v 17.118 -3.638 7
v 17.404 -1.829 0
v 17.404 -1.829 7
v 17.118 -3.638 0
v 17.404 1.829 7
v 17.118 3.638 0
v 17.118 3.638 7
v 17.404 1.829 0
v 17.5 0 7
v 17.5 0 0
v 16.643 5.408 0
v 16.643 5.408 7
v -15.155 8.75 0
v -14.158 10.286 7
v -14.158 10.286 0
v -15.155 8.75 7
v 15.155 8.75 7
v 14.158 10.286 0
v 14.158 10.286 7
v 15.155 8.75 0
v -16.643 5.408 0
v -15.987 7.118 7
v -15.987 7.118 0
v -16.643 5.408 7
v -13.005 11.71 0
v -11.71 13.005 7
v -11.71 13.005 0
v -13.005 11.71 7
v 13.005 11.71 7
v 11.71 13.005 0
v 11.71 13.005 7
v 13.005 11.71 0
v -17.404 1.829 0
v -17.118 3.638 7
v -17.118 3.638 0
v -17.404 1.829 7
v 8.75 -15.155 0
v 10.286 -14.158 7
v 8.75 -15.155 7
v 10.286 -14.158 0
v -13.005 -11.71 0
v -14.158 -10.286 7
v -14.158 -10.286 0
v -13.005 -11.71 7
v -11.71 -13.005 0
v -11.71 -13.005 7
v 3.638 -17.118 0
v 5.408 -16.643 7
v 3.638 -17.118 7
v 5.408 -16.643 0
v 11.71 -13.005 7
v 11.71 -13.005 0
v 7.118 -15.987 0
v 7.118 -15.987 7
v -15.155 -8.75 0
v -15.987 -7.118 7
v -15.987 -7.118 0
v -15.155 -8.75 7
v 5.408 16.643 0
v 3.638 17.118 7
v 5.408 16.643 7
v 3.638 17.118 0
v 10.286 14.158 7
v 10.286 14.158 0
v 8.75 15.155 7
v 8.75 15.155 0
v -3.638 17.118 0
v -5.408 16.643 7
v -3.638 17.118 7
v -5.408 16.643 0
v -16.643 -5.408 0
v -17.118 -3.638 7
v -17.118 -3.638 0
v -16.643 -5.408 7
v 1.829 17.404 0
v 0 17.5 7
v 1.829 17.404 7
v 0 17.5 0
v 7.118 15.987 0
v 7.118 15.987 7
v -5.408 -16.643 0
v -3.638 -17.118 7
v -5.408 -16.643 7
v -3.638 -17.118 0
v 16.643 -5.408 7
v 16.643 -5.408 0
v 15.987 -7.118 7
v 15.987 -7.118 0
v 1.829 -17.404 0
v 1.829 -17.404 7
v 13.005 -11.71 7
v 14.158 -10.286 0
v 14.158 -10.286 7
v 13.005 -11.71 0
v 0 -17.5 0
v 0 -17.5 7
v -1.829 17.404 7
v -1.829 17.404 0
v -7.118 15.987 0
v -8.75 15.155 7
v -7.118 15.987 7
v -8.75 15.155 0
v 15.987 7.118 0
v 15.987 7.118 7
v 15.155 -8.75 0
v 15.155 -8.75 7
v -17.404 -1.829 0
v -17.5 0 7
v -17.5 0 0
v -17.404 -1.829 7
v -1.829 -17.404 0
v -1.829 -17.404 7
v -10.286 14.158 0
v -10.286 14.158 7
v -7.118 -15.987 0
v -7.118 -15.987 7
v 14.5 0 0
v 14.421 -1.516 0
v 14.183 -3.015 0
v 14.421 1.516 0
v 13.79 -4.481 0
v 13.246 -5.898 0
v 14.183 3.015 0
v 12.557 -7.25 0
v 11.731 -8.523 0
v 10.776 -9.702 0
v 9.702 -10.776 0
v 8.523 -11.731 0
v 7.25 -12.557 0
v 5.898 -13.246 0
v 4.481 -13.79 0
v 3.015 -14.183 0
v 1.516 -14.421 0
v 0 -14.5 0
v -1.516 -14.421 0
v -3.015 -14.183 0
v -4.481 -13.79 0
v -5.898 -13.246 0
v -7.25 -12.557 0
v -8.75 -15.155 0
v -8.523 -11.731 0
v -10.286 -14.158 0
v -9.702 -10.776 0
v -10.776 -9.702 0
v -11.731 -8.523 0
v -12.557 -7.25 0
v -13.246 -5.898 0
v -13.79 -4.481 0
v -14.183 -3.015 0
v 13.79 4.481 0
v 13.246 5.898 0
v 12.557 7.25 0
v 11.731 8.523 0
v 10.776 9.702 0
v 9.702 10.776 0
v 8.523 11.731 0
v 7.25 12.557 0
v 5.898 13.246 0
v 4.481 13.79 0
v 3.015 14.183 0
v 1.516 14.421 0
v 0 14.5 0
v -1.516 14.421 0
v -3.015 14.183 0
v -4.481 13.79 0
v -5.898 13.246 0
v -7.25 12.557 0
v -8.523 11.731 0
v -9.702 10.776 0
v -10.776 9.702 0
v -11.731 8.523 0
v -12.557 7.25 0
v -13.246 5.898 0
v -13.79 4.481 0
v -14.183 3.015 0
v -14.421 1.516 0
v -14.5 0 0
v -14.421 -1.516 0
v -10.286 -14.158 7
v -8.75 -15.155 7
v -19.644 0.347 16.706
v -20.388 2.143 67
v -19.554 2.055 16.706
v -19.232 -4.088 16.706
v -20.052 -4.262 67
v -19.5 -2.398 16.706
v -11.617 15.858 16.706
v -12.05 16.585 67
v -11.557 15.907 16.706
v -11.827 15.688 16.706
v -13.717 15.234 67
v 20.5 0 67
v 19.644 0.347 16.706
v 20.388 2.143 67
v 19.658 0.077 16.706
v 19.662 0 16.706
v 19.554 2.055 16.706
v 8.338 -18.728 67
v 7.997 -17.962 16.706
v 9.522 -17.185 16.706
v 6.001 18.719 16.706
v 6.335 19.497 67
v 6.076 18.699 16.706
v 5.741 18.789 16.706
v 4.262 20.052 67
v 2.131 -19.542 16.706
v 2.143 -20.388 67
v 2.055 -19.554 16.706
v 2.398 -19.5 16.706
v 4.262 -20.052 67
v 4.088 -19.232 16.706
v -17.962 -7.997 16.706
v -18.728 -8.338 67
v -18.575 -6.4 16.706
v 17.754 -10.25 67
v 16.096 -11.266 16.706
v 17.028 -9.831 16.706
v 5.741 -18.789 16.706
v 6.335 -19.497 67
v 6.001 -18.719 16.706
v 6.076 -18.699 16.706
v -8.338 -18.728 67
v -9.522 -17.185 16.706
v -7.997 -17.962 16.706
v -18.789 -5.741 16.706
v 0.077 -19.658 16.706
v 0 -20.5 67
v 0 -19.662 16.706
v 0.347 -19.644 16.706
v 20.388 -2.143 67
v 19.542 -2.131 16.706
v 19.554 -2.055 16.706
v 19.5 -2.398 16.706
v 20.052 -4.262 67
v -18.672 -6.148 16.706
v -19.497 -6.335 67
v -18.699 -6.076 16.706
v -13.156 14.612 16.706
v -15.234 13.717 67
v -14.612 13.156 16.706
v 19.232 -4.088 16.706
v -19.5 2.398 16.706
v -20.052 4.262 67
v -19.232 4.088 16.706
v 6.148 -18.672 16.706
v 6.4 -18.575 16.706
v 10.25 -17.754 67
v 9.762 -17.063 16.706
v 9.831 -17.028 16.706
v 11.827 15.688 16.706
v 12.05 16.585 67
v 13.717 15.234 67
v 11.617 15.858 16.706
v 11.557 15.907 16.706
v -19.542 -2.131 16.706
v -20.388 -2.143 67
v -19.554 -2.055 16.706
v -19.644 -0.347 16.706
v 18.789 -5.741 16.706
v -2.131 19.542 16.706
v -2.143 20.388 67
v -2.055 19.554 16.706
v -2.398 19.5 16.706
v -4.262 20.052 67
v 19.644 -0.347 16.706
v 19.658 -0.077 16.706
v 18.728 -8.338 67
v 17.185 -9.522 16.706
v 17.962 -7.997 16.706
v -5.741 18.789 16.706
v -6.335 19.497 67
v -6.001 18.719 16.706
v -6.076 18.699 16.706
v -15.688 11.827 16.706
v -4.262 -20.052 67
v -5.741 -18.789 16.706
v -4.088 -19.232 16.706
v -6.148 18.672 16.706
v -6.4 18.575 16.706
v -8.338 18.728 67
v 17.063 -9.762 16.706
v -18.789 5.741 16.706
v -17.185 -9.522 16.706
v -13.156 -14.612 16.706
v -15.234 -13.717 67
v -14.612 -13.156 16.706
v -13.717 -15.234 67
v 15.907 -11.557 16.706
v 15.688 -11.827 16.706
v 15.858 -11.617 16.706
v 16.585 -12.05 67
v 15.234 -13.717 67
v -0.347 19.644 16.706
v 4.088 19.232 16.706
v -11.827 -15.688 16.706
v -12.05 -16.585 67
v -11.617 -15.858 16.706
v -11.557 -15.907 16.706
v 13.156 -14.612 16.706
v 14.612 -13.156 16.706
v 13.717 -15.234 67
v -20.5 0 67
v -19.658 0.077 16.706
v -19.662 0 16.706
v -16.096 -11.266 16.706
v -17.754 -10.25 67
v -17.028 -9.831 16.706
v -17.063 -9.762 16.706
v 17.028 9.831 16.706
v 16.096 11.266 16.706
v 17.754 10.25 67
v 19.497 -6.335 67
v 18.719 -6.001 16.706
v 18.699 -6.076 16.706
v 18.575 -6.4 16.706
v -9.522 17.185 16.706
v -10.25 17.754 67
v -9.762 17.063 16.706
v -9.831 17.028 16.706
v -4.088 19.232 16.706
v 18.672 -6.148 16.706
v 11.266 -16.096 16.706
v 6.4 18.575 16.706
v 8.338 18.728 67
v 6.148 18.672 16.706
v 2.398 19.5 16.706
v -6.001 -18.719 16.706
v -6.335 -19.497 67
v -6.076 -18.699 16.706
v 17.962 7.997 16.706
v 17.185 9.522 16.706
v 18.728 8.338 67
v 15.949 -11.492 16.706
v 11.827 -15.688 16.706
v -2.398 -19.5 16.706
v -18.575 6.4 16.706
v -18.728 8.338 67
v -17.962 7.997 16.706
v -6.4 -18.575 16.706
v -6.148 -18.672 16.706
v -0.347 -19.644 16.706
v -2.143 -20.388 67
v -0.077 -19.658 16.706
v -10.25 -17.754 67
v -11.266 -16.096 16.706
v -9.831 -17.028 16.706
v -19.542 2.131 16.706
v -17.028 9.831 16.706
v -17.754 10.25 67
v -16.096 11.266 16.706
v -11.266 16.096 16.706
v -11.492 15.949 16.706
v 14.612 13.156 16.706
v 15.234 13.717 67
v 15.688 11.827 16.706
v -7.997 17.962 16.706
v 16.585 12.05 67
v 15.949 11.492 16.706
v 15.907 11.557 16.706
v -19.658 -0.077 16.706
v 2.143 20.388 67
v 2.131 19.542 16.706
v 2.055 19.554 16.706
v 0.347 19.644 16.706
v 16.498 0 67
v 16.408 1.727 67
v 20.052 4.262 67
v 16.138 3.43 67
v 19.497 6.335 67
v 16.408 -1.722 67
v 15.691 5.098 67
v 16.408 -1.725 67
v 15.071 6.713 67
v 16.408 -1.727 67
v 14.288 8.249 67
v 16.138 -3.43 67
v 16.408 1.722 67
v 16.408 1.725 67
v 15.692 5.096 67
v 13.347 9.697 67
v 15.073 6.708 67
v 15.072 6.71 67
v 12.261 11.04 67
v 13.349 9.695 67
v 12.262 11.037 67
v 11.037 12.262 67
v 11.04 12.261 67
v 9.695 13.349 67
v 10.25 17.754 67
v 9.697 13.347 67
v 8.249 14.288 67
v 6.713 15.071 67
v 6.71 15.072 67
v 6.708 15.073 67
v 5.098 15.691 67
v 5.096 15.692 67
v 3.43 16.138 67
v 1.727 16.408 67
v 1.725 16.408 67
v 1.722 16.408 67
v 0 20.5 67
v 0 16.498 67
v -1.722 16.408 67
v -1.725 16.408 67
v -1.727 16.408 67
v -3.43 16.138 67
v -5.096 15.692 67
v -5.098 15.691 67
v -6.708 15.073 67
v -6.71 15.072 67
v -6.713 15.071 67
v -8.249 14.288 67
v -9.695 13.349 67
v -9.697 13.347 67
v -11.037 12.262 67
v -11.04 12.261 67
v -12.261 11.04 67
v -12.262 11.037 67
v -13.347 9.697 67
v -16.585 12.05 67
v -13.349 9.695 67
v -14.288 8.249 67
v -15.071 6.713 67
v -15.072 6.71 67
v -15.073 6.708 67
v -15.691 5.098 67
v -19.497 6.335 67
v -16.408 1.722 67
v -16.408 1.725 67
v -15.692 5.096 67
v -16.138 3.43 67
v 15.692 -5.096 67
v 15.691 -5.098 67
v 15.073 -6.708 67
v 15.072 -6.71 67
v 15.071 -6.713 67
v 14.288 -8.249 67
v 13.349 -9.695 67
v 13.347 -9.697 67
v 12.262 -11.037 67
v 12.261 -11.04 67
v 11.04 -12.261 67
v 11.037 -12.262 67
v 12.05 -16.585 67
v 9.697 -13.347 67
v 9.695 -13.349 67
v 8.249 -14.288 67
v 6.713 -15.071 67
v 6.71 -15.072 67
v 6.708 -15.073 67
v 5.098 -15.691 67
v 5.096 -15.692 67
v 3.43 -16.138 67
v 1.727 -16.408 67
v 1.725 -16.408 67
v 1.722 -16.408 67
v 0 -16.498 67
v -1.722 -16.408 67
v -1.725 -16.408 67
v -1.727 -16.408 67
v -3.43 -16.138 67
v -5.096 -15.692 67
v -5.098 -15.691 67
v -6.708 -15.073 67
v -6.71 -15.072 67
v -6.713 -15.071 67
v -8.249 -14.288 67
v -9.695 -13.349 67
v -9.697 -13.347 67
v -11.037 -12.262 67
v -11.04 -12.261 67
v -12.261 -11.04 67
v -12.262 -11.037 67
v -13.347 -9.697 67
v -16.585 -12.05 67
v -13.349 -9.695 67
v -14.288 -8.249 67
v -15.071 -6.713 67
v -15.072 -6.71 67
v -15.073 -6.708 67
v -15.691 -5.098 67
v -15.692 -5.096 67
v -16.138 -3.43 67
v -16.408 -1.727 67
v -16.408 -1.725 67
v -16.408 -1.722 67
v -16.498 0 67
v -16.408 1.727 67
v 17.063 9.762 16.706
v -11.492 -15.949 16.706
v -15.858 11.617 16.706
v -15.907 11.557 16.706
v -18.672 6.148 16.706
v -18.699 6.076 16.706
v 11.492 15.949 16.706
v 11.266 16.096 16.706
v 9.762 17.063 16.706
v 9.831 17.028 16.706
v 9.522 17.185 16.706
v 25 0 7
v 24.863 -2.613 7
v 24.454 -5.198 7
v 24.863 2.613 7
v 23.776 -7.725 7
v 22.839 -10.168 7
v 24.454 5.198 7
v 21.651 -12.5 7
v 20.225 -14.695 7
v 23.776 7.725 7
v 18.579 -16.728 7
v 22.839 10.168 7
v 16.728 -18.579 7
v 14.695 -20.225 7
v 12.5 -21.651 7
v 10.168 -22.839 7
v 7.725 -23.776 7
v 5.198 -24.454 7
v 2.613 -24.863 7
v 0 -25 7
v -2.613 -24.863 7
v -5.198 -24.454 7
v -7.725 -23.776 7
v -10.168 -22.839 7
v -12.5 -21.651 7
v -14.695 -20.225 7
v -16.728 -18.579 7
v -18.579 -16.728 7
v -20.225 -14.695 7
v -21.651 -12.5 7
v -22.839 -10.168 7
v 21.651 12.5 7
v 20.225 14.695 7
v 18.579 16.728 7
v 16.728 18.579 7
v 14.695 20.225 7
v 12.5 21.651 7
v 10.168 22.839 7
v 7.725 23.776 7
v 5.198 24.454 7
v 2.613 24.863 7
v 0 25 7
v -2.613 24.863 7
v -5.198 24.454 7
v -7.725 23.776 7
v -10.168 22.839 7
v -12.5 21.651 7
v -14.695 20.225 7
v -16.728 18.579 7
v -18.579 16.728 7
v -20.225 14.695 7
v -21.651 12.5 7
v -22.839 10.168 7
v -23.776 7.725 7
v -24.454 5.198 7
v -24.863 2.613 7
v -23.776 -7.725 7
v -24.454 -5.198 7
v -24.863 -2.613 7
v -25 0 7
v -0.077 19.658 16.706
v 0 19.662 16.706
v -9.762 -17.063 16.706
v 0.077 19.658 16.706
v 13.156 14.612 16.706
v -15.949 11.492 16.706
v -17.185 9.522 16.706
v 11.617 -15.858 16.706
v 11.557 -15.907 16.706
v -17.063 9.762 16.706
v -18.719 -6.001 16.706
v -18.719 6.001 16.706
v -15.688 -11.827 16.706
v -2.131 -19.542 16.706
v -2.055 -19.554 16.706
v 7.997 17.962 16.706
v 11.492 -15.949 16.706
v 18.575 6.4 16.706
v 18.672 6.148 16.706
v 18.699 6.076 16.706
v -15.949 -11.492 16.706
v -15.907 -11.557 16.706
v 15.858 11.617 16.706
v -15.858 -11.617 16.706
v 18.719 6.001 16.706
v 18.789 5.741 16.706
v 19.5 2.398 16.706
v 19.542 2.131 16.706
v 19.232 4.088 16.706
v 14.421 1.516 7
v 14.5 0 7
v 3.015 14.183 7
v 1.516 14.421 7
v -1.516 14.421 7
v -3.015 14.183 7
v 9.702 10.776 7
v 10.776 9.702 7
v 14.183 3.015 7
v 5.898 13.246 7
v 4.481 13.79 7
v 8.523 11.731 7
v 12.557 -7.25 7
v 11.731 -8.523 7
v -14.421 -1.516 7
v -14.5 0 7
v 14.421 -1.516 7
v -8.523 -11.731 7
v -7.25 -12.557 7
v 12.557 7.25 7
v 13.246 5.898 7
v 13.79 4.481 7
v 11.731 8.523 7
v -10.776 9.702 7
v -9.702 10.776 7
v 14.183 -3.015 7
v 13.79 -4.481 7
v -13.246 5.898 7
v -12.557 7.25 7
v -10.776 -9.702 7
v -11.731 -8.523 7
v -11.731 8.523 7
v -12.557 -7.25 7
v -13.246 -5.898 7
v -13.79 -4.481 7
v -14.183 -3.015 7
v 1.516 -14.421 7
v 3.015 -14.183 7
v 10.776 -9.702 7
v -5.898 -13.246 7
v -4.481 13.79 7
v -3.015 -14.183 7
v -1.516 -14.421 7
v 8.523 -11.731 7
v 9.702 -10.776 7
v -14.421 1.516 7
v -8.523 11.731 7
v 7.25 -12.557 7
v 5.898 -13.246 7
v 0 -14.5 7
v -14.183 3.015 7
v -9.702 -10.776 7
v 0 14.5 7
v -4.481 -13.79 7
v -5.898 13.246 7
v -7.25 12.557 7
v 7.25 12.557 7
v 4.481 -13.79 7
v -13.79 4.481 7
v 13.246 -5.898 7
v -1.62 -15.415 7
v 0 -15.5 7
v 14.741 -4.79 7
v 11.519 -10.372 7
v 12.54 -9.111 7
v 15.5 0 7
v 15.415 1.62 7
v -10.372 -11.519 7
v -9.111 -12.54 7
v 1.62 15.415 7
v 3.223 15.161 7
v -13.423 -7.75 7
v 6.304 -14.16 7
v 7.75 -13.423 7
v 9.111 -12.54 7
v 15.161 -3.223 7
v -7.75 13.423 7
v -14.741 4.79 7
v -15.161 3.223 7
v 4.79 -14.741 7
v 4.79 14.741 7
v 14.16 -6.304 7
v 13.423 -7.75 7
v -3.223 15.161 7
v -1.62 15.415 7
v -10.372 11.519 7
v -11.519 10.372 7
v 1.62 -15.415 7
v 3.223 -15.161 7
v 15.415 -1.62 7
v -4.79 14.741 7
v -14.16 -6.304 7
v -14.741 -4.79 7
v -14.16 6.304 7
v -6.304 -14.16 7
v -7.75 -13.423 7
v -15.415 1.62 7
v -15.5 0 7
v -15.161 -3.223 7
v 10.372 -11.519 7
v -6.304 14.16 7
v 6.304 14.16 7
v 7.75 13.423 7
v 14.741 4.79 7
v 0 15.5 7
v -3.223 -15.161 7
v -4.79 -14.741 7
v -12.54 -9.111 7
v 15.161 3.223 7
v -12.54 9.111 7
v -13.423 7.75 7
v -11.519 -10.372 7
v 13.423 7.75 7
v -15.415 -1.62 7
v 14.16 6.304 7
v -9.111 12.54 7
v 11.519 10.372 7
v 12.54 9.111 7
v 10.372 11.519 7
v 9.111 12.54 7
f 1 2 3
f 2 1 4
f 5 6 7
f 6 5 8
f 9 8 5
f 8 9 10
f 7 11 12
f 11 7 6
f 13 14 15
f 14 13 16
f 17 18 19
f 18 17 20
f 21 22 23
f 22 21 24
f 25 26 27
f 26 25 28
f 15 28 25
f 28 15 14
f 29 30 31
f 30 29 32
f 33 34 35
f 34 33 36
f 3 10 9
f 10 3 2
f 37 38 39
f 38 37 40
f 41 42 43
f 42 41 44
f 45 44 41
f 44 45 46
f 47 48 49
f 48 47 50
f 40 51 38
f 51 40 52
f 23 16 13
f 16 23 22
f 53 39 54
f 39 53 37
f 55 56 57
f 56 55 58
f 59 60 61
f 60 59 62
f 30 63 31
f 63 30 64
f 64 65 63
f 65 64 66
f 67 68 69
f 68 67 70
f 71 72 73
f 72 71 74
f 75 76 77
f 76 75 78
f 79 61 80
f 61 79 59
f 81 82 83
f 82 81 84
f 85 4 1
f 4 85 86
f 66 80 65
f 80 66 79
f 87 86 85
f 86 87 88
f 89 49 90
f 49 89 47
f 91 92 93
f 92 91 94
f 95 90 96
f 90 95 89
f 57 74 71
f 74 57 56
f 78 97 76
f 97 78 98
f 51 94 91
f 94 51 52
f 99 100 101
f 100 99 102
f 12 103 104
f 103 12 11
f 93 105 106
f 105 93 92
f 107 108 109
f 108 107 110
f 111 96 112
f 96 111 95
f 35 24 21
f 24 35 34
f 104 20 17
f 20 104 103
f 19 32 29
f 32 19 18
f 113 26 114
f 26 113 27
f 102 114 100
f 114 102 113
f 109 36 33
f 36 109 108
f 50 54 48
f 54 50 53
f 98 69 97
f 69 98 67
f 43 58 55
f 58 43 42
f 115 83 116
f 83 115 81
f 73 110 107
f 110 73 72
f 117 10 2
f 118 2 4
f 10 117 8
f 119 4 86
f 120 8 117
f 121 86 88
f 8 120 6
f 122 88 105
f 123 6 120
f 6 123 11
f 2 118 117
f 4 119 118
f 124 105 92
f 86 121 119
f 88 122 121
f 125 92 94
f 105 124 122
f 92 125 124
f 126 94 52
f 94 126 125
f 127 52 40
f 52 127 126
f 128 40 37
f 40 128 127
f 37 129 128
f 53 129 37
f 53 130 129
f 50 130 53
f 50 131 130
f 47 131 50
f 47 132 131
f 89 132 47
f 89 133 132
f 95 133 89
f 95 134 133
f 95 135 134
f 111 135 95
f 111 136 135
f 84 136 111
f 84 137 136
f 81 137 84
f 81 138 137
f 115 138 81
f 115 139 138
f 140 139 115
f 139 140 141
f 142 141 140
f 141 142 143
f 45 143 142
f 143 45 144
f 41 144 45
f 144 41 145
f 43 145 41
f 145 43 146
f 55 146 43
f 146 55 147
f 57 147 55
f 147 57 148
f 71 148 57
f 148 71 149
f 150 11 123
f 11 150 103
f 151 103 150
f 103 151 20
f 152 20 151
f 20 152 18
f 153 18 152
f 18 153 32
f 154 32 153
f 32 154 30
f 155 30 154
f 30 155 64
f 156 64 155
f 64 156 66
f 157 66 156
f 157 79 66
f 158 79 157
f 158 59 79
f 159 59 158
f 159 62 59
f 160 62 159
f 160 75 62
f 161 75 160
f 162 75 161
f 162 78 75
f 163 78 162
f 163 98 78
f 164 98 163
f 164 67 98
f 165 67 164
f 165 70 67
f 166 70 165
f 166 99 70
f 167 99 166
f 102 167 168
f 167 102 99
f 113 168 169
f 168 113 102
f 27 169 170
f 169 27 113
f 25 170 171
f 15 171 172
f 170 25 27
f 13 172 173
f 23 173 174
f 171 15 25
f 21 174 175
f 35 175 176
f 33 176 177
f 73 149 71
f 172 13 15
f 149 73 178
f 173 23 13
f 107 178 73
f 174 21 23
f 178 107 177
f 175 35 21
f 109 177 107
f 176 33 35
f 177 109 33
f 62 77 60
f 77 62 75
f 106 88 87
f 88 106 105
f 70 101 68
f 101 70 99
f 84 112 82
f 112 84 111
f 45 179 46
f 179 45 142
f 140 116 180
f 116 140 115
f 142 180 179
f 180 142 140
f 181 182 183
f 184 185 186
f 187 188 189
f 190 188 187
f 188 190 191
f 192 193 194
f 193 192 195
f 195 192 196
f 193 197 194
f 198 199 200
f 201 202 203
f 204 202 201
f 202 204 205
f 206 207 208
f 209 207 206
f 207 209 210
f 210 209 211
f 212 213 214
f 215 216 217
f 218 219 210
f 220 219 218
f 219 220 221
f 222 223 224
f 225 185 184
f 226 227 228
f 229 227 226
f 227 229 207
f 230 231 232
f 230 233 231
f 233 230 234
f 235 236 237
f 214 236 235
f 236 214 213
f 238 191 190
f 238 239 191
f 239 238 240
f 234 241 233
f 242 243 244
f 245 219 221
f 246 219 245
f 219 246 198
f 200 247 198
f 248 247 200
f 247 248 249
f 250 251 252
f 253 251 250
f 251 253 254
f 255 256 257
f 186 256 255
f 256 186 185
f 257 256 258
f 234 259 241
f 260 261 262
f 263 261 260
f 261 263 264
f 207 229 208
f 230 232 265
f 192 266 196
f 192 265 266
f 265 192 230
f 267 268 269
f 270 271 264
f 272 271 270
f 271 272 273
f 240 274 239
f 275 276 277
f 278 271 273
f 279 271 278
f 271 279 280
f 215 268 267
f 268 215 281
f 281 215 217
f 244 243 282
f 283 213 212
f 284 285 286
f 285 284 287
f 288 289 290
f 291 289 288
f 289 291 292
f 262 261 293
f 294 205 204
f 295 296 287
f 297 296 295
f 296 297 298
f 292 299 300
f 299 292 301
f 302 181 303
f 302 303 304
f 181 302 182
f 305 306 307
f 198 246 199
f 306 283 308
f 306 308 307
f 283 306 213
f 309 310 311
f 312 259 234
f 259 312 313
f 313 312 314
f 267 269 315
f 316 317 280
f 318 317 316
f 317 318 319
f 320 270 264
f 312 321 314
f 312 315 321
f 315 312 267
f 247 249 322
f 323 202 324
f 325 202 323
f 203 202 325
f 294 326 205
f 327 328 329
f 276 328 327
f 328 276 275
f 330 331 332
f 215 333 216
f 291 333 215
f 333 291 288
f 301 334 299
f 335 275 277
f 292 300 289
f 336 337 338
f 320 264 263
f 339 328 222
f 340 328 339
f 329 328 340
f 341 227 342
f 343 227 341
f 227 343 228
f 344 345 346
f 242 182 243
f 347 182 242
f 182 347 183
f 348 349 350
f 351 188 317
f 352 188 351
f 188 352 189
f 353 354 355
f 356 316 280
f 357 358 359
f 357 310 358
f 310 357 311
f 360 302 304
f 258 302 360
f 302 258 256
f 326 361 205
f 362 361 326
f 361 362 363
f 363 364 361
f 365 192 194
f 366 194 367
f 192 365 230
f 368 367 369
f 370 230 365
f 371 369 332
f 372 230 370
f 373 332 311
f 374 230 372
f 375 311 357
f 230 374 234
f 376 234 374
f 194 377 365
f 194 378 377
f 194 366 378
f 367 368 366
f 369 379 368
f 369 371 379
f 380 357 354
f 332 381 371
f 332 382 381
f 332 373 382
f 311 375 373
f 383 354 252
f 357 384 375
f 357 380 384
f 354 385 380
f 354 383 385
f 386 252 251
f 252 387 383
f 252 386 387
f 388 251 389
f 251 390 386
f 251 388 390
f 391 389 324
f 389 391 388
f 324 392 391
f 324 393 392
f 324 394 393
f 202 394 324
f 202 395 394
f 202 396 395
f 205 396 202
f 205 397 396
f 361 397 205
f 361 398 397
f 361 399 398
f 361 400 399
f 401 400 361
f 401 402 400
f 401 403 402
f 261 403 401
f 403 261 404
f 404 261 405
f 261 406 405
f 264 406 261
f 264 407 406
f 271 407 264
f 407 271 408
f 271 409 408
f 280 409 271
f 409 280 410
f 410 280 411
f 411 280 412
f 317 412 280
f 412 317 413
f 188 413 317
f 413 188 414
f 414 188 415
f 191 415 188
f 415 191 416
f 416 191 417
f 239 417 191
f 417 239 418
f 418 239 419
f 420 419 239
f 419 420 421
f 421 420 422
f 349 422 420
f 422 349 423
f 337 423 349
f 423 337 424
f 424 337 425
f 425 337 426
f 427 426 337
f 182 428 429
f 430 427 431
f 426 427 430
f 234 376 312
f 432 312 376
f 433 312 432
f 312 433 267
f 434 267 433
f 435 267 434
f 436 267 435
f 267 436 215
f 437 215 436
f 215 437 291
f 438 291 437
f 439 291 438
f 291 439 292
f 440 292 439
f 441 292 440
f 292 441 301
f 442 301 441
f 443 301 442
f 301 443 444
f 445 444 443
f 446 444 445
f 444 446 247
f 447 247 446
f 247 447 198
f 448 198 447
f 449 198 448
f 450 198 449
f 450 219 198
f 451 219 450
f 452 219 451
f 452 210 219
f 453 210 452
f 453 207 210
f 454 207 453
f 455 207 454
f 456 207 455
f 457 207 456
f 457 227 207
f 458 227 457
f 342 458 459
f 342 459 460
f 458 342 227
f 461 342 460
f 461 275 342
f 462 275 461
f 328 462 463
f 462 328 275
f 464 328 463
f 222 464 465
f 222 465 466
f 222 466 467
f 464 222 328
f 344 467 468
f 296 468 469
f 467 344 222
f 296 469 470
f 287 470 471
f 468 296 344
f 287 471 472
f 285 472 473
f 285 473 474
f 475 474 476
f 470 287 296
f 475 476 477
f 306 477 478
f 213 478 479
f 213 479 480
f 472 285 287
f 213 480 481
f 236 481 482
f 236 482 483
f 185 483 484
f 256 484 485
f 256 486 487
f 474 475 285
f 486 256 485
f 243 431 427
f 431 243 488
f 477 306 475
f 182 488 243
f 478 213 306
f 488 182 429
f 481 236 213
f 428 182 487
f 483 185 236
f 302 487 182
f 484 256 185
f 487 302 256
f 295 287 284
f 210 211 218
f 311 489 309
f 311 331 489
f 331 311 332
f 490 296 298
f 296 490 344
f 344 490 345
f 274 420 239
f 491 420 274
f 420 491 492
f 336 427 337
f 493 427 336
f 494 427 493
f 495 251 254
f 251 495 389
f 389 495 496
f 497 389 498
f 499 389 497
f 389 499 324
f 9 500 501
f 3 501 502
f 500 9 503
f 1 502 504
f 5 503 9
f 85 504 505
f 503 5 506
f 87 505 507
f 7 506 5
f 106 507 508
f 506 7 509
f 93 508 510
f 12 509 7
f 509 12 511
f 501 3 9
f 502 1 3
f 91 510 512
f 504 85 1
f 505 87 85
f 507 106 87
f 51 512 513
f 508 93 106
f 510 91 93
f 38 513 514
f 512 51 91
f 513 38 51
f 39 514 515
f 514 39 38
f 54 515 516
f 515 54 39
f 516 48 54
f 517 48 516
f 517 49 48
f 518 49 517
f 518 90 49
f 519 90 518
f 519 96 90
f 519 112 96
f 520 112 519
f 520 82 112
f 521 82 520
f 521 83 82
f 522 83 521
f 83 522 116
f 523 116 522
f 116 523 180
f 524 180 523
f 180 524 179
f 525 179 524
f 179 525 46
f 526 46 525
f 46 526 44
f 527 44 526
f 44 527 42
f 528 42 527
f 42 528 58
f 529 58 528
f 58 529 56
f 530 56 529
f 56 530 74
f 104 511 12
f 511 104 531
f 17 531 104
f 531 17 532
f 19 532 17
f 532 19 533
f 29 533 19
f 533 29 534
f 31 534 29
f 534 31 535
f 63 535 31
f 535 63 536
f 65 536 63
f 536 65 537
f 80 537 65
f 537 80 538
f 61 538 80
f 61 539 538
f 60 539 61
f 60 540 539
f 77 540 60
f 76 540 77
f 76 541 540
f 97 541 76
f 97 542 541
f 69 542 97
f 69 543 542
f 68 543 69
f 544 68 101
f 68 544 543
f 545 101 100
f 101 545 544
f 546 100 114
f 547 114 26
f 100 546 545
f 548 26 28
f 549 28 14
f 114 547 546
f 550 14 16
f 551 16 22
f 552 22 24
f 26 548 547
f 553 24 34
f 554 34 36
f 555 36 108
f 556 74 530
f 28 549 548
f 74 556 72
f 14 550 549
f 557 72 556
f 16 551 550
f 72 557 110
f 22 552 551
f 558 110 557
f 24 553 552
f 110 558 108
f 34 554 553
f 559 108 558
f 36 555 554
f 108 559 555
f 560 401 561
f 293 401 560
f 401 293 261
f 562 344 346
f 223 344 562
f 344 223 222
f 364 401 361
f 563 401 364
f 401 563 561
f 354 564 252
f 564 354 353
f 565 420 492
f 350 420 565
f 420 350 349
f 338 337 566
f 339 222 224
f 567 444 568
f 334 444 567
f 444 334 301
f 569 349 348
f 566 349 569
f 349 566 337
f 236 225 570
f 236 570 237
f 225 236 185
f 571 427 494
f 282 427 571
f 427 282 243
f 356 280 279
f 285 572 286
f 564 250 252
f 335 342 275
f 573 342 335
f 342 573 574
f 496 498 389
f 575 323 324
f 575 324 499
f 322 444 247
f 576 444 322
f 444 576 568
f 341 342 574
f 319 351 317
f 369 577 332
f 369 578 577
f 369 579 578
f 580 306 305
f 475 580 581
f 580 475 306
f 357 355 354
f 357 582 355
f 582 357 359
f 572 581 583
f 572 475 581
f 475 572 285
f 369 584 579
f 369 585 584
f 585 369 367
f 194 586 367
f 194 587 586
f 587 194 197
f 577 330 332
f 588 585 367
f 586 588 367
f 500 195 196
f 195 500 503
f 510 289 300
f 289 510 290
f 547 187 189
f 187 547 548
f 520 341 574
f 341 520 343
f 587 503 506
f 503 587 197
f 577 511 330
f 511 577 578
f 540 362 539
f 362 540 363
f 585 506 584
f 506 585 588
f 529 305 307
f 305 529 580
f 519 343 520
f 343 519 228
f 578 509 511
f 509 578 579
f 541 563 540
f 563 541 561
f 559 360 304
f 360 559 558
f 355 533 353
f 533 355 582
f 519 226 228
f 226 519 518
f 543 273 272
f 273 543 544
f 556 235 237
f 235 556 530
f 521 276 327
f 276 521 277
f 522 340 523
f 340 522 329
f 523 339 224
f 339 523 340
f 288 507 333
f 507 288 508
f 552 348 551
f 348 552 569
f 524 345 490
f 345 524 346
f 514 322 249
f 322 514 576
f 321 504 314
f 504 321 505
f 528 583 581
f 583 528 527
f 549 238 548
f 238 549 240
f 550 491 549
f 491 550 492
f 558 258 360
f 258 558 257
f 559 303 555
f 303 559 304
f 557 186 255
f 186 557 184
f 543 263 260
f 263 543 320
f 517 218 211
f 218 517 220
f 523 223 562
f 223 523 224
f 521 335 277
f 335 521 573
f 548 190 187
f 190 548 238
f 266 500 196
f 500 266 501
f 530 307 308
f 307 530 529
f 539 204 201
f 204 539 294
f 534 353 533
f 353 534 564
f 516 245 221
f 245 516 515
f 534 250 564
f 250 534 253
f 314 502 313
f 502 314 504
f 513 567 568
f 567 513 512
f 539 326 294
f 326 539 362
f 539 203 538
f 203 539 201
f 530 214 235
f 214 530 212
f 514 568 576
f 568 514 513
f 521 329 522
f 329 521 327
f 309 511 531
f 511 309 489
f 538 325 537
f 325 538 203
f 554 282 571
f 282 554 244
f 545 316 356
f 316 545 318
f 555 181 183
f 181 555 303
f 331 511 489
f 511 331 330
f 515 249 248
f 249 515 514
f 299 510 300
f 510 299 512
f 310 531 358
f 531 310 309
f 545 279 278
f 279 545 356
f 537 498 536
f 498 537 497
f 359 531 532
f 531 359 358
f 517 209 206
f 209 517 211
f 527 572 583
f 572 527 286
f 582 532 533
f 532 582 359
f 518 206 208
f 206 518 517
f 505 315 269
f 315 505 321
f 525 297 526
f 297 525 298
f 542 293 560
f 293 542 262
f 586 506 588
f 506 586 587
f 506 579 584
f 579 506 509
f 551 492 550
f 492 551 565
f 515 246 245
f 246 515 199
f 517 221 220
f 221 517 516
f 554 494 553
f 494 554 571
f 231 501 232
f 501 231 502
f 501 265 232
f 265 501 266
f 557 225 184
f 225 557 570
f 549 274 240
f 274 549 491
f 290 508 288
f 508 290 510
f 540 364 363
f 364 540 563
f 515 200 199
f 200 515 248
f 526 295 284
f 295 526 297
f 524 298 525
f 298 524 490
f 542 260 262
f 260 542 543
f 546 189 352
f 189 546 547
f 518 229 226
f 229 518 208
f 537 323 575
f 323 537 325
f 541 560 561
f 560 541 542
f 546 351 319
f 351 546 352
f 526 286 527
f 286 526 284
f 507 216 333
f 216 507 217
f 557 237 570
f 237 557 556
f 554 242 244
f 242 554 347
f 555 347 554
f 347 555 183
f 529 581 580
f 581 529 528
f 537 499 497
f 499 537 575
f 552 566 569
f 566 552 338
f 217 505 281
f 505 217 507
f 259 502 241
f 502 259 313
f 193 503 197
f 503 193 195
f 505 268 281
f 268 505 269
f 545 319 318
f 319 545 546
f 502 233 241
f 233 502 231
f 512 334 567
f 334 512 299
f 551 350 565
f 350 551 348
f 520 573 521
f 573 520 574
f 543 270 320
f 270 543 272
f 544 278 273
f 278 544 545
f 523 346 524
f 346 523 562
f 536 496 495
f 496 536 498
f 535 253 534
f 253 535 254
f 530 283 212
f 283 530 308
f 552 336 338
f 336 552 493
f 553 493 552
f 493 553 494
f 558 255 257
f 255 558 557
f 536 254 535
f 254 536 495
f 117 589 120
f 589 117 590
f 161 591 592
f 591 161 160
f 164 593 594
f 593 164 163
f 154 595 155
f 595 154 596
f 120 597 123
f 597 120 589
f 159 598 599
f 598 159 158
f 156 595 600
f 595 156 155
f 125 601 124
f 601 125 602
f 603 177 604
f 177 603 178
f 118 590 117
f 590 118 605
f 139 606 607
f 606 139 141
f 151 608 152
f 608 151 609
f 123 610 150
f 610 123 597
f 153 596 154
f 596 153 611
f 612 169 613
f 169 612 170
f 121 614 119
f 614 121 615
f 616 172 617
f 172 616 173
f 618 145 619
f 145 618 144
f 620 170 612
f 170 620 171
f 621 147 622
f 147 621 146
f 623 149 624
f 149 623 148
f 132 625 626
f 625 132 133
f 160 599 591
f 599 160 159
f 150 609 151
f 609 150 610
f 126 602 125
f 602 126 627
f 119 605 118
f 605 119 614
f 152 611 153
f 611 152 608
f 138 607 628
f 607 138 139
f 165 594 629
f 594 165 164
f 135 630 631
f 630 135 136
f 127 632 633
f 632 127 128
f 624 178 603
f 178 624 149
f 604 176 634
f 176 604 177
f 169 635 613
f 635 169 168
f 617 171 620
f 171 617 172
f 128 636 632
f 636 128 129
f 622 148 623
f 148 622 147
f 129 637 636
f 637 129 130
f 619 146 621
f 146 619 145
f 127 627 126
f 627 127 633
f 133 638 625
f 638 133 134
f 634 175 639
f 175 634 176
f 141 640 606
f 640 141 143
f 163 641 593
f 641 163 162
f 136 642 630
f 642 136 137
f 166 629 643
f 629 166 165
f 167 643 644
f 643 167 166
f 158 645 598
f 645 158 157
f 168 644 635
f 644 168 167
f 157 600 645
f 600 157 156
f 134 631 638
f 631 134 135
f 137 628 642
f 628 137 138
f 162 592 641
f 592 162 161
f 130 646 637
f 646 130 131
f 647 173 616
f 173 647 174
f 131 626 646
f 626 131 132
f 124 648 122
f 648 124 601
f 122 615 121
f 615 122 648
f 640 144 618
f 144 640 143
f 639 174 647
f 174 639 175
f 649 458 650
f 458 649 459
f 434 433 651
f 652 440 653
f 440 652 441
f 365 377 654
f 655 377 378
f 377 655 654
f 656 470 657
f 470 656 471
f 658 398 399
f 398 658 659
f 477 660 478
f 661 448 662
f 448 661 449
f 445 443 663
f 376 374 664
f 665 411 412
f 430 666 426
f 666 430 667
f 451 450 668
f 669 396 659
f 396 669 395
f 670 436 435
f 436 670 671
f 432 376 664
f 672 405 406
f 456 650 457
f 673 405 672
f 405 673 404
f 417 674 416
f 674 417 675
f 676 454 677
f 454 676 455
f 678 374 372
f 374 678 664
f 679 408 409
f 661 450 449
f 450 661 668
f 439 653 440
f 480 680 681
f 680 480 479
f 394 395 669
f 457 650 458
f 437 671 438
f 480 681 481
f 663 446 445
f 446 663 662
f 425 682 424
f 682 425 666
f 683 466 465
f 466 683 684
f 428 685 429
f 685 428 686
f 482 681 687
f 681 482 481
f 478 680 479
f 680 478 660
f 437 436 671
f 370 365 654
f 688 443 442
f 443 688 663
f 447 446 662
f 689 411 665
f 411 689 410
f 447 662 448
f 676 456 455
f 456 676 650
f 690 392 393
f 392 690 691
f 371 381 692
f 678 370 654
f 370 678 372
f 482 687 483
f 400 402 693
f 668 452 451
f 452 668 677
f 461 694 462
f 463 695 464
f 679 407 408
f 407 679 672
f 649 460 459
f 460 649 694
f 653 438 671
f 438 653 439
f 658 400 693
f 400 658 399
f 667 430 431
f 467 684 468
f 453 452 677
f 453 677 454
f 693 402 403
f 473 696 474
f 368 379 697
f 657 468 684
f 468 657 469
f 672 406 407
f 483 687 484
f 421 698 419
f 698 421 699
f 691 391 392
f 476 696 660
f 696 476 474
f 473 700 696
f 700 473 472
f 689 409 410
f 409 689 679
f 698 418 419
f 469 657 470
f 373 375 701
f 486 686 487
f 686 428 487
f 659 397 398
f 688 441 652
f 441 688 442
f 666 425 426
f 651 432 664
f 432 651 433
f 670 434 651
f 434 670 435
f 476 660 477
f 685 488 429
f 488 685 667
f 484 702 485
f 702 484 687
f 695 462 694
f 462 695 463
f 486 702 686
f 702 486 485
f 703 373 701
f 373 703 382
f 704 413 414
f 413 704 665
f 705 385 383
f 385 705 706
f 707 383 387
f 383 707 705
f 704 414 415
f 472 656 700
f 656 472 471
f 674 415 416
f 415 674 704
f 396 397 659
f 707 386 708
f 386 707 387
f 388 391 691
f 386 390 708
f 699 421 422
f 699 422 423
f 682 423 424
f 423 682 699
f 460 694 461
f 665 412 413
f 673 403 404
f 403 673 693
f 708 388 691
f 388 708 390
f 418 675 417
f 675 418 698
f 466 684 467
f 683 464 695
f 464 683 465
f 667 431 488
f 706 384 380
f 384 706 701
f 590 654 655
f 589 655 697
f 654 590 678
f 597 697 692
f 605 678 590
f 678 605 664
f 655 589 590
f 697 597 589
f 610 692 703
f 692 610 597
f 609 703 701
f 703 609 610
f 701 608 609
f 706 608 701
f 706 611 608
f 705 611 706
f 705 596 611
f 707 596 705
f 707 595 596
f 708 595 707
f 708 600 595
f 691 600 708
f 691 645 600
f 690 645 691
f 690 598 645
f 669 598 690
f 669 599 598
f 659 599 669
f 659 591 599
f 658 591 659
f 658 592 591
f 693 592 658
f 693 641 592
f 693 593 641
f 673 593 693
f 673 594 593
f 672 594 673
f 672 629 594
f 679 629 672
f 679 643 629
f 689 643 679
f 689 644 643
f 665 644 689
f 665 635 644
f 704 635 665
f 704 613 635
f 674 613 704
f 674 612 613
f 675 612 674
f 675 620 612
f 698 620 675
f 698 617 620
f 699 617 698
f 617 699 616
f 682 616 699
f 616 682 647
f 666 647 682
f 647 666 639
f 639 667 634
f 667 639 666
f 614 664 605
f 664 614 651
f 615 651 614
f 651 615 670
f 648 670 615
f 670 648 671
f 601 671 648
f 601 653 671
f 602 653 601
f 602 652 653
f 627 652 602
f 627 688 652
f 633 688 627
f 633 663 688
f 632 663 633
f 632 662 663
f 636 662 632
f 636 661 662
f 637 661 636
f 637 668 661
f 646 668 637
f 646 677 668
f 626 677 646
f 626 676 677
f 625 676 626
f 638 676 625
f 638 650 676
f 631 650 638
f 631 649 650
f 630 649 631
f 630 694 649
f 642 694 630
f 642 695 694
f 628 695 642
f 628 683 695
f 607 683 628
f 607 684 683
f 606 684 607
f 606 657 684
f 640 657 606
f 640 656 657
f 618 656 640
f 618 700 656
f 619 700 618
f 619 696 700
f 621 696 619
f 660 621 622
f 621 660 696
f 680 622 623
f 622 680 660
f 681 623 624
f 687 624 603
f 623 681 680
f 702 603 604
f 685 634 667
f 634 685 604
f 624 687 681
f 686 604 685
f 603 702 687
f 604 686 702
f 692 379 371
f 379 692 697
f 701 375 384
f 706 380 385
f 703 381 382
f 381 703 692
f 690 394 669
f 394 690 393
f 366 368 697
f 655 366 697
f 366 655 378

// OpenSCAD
$fn= 60;

difference(){
  union(){
    cylinder(h=60, d=35);
    translate([0, 0, 7]) cylinder(h=60, d1=39, d2=41);
    translate([0, 0, 7]) cylinder(h=10, d1=50, d2=39);

  }
  translate([0, 0, -1]) cylinder(h=70, d=29);
  translate([0, 0, 7]) cylinder(h=60.1, d1=31, d2=33);
}
